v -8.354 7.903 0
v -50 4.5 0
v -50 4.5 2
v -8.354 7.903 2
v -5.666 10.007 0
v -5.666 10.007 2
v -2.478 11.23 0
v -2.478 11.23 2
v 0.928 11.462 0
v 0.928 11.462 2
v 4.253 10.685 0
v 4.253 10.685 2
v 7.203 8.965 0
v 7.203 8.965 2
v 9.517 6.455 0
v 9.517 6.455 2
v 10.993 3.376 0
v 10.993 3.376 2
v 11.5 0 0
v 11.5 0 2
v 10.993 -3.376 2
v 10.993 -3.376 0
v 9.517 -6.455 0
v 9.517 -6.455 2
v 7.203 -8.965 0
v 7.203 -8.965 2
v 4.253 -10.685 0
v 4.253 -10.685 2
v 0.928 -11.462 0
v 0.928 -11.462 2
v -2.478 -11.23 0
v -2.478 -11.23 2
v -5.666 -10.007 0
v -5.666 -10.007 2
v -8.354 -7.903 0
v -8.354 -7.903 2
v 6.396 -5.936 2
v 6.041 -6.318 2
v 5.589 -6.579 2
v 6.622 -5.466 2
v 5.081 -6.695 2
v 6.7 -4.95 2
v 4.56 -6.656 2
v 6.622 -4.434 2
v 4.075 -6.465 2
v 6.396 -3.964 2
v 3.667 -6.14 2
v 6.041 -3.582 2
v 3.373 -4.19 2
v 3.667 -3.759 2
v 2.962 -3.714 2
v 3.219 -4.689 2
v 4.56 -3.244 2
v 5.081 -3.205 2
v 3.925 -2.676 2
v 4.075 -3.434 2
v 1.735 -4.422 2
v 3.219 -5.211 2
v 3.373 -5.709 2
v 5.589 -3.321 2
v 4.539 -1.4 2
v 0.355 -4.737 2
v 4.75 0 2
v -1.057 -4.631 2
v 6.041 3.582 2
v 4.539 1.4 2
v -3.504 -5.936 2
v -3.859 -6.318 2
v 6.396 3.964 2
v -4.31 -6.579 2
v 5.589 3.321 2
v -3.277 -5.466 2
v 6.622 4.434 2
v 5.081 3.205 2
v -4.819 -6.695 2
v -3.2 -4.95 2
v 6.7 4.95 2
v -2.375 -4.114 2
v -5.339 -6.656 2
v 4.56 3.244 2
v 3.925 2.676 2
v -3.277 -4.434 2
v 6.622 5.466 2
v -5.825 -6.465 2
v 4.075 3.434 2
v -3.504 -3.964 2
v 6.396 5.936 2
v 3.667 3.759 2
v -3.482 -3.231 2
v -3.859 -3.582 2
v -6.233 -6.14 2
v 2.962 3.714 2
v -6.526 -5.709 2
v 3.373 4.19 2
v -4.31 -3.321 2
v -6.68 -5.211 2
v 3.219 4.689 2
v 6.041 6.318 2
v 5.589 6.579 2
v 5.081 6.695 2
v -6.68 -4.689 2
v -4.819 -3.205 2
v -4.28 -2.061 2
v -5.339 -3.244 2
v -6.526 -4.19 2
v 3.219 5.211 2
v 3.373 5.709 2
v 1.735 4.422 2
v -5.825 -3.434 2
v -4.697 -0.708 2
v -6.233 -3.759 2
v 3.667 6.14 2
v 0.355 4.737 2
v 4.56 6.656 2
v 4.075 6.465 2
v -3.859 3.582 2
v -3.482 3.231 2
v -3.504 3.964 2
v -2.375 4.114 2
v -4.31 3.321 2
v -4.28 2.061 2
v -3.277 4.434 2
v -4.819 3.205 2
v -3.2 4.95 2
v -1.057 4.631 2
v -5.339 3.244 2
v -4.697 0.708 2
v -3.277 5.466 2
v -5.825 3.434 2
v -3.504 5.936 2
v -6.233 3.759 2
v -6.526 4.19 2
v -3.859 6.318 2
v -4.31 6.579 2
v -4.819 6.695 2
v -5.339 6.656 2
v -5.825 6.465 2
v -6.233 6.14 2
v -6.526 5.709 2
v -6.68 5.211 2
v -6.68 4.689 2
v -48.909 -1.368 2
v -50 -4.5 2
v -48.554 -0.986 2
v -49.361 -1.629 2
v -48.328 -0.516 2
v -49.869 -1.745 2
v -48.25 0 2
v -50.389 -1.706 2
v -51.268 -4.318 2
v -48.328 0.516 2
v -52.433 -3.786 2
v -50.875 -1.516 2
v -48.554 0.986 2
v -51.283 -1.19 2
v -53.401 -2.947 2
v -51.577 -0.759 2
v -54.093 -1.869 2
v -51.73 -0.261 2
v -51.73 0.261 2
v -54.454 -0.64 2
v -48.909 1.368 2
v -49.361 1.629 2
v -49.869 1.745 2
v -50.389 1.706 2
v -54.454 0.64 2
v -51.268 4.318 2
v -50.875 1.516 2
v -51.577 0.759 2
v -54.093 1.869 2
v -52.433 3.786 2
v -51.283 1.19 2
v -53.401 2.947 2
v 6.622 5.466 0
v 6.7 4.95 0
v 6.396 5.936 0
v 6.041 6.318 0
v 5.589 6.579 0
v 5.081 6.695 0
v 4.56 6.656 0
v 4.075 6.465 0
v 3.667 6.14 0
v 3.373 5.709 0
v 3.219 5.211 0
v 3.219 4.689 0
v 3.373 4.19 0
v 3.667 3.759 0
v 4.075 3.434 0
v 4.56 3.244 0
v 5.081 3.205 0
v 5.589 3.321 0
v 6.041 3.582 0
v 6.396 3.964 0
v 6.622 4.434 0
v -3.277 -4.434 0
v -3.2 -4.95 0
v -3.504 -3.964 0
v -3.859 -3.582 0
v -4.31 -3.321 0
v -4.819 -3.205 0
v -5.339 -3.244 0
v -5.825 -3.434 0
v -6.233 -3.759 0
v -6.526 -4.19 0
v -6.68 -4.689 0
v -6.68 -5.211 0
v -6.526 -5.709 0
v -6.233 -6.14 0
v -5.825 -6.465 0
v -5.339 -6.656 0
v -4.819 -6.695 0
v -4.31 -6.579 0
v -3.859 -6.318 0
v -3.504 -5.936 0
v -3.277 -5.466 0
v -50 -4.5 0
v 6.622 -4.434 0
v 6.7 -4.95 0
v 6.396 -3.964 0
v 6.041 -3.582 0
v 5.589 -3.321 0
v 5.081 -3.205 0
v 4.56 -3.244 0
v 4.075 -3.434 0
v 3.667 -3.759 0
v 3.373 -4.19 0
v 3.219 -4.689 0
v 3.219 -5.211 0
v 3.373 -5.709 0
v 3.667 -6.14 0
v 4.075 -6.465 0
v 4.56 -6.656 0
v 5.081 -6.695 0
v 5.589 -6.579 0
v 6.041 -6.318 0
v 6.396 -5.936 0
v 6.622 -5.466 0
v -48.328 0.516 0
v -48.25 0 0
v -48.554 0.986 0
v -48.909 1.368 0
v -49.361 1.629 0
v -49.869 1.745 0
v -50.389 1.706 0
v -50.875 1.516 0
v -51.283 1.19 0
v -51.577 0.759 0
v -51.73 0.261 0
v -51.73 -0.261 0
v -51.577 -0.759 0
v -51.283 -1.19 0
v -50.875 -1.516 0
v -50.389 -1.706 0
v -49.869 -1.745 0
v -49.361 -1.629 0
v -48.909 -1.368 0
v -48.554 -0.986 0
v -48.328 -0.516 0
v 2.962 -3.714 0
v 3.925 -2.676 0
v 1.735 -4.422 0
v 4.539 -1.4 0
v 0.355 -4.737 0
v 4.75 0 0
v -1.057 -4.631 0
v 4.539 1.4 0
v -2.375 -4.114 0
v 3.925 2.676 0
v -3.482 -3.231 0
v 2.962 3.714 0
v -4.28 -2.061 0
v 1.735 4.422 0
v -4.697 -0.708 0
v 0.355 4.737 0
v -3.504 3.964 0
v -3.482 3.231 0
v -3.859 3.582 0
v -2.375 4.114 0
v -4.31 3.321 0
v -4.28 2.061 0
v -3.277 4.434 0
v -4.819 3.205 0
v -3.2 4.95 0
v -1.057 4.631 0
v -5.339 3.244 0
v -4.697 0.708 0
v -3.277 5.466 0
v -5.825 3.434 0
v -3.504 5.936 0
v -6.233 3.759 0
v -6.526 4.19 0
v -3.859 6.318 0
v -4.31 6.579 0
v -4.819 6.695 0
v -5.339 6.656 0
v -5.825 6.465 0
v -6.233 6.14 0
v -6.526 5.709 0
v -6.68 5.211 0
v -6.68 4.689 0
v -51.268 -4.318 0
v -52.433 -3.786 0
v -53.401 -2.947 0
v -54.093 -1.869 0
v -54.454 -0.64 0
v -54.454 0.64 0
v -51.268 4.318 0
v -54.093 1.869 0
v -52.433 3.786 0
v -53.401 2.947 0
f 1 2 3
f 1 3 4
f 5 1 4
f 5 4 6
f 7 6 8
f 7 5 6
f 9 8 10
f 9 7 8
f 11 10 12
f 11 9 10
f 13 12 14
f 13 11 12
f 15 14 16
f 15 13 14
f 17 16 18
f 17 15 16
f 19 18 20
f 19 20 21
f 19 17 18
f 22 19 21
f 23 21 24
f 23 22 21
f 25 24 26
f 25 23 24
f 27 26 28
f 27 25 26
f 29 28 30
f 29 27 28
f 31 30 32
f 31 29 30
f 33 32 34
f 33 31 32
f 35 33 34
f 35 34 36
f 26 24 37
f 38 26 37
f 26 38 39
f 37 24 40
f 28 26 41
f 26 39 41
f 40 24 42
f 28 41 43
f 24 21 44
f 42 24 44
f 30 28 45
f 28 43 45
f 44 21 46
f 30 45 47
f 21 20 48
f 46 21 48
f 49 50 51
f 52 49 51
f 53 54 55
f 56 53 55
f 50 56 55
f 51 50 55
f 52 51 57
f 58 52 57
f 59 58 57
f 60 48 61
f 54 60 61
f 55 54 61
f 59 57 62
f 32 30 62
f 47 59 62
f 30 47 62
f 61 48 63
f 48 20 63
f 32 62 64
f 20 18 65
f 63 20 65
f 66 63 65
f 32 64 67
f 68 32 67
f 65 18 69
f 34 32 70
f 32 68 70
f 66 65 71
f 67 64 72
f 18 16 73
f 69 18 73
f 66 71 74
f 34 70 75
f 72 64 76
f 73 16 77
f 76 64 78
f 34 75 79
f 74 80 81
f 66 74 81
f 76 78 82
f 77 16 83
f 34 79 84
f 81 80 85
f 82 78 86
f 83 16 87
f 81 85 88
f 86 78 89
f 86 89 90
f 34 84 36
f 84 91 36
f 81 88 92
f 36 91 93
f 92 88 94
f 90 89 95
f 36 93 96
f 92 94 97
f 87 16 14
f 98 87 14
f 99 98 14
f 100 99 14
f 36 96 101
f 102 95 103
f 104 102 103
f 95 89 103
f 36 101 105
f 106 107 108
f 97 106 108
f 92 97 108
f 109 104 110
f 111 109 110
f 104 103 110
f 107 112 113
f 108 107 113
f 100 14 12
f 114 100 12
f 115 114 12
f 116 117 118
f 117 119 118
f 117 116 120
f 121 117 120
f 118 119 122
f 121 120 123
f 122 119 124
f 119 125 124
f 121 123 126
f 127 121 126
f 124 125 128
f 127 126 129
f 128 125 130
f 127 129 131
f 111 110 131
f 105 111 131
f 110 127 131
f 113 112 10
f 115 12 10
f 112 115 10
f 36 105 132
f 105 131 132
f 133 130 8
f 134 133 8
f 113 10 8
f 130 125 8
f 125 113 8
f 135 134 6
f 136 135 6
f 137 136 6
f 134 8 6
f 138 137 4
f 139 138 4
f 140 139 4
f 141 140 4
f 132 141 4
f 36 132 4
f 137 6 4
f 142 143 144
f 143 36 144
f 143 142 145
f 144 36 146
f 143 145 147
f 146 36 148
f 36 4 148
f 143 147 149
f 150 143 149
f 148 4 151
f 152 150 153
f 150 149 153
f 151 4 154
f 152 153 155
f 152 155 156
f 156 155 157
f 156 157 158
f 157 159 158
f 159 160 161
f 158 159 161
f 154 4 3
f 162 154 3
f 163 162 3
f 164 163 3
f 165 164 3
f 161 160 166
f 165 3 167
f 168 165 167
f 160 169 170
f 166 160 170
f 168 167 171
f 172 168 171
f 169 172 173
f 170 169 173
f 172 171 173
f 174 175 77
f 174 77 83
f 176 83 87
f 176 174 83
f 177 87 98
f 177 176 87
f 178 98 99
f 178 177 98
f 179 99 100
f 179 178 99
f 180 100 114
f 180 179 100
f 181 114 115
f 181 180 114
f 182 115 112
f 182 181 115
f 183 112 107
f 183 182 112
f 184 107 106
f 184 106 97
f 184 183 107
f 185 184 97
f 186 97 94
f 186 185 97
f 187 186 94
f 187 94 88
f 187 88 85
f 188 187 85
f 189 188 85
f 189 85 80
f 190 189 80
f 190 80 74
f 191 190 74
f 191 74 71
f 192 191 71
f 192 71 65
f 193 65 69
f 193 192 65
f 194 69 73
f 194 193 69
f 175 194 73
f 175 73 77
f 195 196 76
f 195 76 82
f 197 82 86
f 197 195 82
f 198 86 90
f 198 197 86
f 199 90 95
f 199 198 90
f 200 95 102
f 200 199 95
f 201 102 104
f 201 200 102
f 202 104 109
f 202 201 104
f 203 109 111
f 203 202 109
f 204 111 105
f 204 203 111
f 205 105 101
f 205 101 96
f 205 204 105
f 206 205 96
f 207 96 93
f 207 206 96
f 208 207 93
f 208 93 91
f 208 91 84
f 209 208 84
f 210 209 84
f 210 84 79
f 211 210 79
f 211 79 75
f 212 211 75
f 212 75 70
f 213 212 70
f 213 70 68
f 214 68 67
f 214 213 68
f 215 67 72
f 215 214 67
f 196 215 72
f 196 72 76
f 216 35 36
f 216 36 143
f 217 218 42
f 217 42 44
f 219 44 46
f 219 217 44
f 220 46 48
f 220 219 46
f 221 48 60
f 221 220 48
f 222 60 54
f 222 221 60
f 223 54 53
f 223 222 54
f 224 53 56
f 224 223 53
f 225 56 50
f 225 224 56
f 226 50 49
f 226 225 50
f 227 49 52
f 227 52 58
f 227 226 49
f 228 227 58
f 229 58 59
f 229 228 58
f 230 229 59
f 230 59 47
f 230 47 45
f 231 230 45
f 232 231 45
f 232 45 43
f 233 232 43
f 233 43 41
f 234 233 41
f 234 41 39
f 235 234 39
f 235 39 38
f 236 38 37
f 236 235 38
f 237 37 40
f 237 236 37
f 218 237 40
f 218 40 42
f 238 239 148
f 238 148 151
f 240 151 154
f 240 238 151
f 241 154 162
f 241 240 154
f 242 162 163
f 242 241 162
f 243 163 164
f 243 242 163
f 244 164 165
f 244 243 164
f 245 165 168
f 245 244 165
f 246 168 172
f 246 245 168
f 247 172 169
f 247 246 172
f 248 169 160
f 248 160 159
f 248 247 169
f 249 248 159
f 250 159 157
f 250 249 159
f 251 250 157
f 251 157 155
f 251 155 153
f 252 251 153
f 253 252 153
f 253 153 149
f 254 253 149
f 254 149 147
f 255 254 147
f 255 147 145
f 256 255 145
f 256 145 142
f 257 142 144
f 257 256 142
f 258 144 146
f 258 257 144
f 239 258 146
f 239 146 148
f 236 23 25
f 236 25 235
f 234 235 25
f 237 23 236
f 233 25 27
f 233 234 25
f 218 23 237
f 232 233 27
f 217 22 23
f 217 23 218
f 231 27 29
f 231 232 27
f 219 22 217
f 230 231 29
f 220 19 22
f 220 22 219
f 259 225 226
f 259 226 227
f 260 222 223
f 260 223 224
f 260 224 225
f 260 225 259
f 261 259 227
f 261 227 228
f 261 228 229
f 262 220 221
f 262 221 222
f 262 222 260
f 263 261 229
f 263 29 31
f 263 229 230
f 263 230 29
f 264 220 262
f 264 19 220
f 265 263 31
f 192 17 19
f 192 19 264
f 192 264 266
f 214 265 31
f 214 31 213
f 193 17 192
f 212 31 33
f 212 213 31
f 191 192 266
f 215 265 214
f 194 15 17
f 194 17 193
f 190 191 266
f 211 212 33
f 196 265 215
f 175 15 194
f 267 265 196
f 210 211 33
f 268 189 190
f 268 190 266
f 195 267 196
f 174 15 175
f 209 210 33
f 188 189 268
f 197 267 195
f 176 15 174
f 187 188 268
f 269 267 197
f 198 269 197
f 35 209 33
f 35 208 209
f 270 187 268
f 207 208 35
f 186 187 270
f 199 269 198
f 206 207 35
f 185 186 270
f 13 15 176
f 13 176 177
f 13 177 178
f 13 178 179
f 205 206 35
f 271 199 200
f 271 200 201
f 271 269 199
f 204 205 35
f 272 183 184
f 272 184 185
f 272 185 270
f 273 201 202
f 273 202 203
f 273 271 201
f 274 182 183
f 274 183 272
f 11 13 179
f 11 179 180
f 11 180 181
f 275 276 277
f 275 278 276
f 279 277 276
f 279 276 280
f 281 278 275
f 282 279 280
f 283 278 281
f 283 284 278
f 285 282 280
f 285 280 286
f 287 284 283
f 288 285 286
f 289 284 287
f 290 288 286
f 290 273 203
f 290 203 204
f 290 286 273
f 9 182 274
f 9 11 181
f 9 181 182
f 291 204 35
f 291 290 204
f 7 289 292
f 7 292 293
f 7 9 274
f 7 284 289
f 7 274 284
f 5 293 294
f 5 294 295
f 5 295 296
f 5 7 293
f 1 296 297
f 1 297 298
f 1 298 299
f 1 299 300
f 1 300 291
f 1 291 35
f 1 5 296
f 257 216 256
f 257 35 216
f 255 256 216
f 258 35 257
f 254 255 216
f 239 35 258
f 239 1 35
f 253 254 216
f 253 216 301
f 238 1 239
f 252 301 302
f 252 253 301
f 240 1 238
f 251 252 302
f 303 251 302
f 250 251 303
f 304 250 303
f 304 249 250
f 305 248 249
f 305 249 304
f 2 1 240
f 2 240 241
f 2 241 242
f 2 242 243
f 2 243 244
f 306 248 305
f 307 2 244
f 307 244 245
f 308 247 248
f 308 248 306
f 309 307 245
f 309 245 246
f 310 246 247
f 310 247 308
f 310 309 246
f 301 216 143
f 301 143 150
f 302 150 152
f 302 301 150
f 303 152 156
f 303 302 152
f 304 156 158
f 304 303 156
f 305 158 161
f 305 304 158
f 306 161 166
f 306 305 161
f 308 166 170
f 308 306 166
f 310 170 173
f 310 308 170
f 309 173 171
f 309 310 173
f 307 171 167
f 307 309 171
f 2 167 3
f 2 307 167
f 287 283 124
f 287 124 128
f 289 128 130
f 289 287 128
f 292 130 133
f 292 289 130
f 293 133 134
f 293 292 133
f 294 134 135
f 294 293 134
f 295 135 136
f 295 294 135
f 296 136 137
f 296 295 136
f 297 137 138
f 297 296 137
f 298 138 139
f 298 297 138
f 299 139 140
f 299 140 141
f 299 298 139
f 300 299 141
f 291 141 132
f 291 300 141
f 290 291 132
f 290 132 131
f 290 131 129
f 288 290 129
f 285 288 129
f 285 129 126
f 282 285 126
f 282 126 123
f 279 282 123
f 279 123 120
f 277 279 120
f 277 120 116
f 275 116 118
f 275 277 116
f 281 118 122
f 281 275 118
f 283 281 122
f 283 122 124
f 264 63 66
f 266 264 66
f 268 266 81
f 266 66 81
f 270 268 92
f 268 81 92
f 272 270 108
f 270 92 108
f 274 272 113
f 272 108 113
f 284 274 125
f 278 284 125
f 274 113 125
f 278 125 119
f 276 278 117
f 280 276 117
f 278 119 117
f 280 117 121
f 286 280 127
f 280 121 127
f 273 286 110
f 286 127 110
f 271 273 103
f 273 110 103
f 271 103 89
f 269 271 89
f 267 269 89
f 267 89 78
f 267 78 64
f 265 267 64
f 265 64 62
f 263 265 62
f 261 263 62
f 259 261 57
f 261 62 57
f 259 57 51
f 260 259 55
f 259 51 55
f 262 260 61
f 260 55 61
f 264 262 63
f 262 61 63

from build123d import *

# Parameters (mm, degrees)
SKETCH_1_R          = 1.75
EXTRUDE_1_DEPTH     = 2
SKETCH_2_R          = 4.75
CUT_EXTRUDE_1_DEPTH = 2


with BuildPart() as part:
    # 草图1 → 凸台-拉伸1 (new body)
    with BuildSketch(Plane.XY):
        with BuildLine():
            Line((-50, 4.5), (-8.354386795, 7.90279832))
            ThreePointArc((-8.354386795, 7.90279832), (11.5, 0), (-8.354386795, -7.90279832))
            Line((-8.354386795, -7.90279832), (-50, -4.5))
            ThreePointArc((-50, -4.5), (-54.5, 0), (-50, 4.5))
        make_face()
        with Locations((-50, 0)):
            Circle(SKETCH_1_R, mode=Mode.SUBTRACT)
        with Locations((4.949747468, 4.949747468)):
            Circle(SKETCH_1_R, mode=Mode.SUBTRACT)
        with Locations((4.949747468, -4.949747468)):
            Circle(SKETCH_1_R, mode=Mode.SUBTRACT)
        with Locations((-4.949747468, -4.949747468)):
            Circle(SKETCH_1_R, mode=Mode.SUBTRACT)
        with Locations((-4.949747468, 4.949747468)):
            Circle(SKETCH_1_R, mode=Mode.SUBTRACT)
    extrude(amount=EXTRUDE_1_DEPTH)

    # 草图2 → 切除-拉伸1 (cut)
    with BuildSketch(Plane.XY.offset(2)):
        Circle(SKETCH_2_R)
    extrude(amount=-CUT_EXTRUDE_1_DEPTH, mode=Mode.SUBTRACT)


solid = part.part
